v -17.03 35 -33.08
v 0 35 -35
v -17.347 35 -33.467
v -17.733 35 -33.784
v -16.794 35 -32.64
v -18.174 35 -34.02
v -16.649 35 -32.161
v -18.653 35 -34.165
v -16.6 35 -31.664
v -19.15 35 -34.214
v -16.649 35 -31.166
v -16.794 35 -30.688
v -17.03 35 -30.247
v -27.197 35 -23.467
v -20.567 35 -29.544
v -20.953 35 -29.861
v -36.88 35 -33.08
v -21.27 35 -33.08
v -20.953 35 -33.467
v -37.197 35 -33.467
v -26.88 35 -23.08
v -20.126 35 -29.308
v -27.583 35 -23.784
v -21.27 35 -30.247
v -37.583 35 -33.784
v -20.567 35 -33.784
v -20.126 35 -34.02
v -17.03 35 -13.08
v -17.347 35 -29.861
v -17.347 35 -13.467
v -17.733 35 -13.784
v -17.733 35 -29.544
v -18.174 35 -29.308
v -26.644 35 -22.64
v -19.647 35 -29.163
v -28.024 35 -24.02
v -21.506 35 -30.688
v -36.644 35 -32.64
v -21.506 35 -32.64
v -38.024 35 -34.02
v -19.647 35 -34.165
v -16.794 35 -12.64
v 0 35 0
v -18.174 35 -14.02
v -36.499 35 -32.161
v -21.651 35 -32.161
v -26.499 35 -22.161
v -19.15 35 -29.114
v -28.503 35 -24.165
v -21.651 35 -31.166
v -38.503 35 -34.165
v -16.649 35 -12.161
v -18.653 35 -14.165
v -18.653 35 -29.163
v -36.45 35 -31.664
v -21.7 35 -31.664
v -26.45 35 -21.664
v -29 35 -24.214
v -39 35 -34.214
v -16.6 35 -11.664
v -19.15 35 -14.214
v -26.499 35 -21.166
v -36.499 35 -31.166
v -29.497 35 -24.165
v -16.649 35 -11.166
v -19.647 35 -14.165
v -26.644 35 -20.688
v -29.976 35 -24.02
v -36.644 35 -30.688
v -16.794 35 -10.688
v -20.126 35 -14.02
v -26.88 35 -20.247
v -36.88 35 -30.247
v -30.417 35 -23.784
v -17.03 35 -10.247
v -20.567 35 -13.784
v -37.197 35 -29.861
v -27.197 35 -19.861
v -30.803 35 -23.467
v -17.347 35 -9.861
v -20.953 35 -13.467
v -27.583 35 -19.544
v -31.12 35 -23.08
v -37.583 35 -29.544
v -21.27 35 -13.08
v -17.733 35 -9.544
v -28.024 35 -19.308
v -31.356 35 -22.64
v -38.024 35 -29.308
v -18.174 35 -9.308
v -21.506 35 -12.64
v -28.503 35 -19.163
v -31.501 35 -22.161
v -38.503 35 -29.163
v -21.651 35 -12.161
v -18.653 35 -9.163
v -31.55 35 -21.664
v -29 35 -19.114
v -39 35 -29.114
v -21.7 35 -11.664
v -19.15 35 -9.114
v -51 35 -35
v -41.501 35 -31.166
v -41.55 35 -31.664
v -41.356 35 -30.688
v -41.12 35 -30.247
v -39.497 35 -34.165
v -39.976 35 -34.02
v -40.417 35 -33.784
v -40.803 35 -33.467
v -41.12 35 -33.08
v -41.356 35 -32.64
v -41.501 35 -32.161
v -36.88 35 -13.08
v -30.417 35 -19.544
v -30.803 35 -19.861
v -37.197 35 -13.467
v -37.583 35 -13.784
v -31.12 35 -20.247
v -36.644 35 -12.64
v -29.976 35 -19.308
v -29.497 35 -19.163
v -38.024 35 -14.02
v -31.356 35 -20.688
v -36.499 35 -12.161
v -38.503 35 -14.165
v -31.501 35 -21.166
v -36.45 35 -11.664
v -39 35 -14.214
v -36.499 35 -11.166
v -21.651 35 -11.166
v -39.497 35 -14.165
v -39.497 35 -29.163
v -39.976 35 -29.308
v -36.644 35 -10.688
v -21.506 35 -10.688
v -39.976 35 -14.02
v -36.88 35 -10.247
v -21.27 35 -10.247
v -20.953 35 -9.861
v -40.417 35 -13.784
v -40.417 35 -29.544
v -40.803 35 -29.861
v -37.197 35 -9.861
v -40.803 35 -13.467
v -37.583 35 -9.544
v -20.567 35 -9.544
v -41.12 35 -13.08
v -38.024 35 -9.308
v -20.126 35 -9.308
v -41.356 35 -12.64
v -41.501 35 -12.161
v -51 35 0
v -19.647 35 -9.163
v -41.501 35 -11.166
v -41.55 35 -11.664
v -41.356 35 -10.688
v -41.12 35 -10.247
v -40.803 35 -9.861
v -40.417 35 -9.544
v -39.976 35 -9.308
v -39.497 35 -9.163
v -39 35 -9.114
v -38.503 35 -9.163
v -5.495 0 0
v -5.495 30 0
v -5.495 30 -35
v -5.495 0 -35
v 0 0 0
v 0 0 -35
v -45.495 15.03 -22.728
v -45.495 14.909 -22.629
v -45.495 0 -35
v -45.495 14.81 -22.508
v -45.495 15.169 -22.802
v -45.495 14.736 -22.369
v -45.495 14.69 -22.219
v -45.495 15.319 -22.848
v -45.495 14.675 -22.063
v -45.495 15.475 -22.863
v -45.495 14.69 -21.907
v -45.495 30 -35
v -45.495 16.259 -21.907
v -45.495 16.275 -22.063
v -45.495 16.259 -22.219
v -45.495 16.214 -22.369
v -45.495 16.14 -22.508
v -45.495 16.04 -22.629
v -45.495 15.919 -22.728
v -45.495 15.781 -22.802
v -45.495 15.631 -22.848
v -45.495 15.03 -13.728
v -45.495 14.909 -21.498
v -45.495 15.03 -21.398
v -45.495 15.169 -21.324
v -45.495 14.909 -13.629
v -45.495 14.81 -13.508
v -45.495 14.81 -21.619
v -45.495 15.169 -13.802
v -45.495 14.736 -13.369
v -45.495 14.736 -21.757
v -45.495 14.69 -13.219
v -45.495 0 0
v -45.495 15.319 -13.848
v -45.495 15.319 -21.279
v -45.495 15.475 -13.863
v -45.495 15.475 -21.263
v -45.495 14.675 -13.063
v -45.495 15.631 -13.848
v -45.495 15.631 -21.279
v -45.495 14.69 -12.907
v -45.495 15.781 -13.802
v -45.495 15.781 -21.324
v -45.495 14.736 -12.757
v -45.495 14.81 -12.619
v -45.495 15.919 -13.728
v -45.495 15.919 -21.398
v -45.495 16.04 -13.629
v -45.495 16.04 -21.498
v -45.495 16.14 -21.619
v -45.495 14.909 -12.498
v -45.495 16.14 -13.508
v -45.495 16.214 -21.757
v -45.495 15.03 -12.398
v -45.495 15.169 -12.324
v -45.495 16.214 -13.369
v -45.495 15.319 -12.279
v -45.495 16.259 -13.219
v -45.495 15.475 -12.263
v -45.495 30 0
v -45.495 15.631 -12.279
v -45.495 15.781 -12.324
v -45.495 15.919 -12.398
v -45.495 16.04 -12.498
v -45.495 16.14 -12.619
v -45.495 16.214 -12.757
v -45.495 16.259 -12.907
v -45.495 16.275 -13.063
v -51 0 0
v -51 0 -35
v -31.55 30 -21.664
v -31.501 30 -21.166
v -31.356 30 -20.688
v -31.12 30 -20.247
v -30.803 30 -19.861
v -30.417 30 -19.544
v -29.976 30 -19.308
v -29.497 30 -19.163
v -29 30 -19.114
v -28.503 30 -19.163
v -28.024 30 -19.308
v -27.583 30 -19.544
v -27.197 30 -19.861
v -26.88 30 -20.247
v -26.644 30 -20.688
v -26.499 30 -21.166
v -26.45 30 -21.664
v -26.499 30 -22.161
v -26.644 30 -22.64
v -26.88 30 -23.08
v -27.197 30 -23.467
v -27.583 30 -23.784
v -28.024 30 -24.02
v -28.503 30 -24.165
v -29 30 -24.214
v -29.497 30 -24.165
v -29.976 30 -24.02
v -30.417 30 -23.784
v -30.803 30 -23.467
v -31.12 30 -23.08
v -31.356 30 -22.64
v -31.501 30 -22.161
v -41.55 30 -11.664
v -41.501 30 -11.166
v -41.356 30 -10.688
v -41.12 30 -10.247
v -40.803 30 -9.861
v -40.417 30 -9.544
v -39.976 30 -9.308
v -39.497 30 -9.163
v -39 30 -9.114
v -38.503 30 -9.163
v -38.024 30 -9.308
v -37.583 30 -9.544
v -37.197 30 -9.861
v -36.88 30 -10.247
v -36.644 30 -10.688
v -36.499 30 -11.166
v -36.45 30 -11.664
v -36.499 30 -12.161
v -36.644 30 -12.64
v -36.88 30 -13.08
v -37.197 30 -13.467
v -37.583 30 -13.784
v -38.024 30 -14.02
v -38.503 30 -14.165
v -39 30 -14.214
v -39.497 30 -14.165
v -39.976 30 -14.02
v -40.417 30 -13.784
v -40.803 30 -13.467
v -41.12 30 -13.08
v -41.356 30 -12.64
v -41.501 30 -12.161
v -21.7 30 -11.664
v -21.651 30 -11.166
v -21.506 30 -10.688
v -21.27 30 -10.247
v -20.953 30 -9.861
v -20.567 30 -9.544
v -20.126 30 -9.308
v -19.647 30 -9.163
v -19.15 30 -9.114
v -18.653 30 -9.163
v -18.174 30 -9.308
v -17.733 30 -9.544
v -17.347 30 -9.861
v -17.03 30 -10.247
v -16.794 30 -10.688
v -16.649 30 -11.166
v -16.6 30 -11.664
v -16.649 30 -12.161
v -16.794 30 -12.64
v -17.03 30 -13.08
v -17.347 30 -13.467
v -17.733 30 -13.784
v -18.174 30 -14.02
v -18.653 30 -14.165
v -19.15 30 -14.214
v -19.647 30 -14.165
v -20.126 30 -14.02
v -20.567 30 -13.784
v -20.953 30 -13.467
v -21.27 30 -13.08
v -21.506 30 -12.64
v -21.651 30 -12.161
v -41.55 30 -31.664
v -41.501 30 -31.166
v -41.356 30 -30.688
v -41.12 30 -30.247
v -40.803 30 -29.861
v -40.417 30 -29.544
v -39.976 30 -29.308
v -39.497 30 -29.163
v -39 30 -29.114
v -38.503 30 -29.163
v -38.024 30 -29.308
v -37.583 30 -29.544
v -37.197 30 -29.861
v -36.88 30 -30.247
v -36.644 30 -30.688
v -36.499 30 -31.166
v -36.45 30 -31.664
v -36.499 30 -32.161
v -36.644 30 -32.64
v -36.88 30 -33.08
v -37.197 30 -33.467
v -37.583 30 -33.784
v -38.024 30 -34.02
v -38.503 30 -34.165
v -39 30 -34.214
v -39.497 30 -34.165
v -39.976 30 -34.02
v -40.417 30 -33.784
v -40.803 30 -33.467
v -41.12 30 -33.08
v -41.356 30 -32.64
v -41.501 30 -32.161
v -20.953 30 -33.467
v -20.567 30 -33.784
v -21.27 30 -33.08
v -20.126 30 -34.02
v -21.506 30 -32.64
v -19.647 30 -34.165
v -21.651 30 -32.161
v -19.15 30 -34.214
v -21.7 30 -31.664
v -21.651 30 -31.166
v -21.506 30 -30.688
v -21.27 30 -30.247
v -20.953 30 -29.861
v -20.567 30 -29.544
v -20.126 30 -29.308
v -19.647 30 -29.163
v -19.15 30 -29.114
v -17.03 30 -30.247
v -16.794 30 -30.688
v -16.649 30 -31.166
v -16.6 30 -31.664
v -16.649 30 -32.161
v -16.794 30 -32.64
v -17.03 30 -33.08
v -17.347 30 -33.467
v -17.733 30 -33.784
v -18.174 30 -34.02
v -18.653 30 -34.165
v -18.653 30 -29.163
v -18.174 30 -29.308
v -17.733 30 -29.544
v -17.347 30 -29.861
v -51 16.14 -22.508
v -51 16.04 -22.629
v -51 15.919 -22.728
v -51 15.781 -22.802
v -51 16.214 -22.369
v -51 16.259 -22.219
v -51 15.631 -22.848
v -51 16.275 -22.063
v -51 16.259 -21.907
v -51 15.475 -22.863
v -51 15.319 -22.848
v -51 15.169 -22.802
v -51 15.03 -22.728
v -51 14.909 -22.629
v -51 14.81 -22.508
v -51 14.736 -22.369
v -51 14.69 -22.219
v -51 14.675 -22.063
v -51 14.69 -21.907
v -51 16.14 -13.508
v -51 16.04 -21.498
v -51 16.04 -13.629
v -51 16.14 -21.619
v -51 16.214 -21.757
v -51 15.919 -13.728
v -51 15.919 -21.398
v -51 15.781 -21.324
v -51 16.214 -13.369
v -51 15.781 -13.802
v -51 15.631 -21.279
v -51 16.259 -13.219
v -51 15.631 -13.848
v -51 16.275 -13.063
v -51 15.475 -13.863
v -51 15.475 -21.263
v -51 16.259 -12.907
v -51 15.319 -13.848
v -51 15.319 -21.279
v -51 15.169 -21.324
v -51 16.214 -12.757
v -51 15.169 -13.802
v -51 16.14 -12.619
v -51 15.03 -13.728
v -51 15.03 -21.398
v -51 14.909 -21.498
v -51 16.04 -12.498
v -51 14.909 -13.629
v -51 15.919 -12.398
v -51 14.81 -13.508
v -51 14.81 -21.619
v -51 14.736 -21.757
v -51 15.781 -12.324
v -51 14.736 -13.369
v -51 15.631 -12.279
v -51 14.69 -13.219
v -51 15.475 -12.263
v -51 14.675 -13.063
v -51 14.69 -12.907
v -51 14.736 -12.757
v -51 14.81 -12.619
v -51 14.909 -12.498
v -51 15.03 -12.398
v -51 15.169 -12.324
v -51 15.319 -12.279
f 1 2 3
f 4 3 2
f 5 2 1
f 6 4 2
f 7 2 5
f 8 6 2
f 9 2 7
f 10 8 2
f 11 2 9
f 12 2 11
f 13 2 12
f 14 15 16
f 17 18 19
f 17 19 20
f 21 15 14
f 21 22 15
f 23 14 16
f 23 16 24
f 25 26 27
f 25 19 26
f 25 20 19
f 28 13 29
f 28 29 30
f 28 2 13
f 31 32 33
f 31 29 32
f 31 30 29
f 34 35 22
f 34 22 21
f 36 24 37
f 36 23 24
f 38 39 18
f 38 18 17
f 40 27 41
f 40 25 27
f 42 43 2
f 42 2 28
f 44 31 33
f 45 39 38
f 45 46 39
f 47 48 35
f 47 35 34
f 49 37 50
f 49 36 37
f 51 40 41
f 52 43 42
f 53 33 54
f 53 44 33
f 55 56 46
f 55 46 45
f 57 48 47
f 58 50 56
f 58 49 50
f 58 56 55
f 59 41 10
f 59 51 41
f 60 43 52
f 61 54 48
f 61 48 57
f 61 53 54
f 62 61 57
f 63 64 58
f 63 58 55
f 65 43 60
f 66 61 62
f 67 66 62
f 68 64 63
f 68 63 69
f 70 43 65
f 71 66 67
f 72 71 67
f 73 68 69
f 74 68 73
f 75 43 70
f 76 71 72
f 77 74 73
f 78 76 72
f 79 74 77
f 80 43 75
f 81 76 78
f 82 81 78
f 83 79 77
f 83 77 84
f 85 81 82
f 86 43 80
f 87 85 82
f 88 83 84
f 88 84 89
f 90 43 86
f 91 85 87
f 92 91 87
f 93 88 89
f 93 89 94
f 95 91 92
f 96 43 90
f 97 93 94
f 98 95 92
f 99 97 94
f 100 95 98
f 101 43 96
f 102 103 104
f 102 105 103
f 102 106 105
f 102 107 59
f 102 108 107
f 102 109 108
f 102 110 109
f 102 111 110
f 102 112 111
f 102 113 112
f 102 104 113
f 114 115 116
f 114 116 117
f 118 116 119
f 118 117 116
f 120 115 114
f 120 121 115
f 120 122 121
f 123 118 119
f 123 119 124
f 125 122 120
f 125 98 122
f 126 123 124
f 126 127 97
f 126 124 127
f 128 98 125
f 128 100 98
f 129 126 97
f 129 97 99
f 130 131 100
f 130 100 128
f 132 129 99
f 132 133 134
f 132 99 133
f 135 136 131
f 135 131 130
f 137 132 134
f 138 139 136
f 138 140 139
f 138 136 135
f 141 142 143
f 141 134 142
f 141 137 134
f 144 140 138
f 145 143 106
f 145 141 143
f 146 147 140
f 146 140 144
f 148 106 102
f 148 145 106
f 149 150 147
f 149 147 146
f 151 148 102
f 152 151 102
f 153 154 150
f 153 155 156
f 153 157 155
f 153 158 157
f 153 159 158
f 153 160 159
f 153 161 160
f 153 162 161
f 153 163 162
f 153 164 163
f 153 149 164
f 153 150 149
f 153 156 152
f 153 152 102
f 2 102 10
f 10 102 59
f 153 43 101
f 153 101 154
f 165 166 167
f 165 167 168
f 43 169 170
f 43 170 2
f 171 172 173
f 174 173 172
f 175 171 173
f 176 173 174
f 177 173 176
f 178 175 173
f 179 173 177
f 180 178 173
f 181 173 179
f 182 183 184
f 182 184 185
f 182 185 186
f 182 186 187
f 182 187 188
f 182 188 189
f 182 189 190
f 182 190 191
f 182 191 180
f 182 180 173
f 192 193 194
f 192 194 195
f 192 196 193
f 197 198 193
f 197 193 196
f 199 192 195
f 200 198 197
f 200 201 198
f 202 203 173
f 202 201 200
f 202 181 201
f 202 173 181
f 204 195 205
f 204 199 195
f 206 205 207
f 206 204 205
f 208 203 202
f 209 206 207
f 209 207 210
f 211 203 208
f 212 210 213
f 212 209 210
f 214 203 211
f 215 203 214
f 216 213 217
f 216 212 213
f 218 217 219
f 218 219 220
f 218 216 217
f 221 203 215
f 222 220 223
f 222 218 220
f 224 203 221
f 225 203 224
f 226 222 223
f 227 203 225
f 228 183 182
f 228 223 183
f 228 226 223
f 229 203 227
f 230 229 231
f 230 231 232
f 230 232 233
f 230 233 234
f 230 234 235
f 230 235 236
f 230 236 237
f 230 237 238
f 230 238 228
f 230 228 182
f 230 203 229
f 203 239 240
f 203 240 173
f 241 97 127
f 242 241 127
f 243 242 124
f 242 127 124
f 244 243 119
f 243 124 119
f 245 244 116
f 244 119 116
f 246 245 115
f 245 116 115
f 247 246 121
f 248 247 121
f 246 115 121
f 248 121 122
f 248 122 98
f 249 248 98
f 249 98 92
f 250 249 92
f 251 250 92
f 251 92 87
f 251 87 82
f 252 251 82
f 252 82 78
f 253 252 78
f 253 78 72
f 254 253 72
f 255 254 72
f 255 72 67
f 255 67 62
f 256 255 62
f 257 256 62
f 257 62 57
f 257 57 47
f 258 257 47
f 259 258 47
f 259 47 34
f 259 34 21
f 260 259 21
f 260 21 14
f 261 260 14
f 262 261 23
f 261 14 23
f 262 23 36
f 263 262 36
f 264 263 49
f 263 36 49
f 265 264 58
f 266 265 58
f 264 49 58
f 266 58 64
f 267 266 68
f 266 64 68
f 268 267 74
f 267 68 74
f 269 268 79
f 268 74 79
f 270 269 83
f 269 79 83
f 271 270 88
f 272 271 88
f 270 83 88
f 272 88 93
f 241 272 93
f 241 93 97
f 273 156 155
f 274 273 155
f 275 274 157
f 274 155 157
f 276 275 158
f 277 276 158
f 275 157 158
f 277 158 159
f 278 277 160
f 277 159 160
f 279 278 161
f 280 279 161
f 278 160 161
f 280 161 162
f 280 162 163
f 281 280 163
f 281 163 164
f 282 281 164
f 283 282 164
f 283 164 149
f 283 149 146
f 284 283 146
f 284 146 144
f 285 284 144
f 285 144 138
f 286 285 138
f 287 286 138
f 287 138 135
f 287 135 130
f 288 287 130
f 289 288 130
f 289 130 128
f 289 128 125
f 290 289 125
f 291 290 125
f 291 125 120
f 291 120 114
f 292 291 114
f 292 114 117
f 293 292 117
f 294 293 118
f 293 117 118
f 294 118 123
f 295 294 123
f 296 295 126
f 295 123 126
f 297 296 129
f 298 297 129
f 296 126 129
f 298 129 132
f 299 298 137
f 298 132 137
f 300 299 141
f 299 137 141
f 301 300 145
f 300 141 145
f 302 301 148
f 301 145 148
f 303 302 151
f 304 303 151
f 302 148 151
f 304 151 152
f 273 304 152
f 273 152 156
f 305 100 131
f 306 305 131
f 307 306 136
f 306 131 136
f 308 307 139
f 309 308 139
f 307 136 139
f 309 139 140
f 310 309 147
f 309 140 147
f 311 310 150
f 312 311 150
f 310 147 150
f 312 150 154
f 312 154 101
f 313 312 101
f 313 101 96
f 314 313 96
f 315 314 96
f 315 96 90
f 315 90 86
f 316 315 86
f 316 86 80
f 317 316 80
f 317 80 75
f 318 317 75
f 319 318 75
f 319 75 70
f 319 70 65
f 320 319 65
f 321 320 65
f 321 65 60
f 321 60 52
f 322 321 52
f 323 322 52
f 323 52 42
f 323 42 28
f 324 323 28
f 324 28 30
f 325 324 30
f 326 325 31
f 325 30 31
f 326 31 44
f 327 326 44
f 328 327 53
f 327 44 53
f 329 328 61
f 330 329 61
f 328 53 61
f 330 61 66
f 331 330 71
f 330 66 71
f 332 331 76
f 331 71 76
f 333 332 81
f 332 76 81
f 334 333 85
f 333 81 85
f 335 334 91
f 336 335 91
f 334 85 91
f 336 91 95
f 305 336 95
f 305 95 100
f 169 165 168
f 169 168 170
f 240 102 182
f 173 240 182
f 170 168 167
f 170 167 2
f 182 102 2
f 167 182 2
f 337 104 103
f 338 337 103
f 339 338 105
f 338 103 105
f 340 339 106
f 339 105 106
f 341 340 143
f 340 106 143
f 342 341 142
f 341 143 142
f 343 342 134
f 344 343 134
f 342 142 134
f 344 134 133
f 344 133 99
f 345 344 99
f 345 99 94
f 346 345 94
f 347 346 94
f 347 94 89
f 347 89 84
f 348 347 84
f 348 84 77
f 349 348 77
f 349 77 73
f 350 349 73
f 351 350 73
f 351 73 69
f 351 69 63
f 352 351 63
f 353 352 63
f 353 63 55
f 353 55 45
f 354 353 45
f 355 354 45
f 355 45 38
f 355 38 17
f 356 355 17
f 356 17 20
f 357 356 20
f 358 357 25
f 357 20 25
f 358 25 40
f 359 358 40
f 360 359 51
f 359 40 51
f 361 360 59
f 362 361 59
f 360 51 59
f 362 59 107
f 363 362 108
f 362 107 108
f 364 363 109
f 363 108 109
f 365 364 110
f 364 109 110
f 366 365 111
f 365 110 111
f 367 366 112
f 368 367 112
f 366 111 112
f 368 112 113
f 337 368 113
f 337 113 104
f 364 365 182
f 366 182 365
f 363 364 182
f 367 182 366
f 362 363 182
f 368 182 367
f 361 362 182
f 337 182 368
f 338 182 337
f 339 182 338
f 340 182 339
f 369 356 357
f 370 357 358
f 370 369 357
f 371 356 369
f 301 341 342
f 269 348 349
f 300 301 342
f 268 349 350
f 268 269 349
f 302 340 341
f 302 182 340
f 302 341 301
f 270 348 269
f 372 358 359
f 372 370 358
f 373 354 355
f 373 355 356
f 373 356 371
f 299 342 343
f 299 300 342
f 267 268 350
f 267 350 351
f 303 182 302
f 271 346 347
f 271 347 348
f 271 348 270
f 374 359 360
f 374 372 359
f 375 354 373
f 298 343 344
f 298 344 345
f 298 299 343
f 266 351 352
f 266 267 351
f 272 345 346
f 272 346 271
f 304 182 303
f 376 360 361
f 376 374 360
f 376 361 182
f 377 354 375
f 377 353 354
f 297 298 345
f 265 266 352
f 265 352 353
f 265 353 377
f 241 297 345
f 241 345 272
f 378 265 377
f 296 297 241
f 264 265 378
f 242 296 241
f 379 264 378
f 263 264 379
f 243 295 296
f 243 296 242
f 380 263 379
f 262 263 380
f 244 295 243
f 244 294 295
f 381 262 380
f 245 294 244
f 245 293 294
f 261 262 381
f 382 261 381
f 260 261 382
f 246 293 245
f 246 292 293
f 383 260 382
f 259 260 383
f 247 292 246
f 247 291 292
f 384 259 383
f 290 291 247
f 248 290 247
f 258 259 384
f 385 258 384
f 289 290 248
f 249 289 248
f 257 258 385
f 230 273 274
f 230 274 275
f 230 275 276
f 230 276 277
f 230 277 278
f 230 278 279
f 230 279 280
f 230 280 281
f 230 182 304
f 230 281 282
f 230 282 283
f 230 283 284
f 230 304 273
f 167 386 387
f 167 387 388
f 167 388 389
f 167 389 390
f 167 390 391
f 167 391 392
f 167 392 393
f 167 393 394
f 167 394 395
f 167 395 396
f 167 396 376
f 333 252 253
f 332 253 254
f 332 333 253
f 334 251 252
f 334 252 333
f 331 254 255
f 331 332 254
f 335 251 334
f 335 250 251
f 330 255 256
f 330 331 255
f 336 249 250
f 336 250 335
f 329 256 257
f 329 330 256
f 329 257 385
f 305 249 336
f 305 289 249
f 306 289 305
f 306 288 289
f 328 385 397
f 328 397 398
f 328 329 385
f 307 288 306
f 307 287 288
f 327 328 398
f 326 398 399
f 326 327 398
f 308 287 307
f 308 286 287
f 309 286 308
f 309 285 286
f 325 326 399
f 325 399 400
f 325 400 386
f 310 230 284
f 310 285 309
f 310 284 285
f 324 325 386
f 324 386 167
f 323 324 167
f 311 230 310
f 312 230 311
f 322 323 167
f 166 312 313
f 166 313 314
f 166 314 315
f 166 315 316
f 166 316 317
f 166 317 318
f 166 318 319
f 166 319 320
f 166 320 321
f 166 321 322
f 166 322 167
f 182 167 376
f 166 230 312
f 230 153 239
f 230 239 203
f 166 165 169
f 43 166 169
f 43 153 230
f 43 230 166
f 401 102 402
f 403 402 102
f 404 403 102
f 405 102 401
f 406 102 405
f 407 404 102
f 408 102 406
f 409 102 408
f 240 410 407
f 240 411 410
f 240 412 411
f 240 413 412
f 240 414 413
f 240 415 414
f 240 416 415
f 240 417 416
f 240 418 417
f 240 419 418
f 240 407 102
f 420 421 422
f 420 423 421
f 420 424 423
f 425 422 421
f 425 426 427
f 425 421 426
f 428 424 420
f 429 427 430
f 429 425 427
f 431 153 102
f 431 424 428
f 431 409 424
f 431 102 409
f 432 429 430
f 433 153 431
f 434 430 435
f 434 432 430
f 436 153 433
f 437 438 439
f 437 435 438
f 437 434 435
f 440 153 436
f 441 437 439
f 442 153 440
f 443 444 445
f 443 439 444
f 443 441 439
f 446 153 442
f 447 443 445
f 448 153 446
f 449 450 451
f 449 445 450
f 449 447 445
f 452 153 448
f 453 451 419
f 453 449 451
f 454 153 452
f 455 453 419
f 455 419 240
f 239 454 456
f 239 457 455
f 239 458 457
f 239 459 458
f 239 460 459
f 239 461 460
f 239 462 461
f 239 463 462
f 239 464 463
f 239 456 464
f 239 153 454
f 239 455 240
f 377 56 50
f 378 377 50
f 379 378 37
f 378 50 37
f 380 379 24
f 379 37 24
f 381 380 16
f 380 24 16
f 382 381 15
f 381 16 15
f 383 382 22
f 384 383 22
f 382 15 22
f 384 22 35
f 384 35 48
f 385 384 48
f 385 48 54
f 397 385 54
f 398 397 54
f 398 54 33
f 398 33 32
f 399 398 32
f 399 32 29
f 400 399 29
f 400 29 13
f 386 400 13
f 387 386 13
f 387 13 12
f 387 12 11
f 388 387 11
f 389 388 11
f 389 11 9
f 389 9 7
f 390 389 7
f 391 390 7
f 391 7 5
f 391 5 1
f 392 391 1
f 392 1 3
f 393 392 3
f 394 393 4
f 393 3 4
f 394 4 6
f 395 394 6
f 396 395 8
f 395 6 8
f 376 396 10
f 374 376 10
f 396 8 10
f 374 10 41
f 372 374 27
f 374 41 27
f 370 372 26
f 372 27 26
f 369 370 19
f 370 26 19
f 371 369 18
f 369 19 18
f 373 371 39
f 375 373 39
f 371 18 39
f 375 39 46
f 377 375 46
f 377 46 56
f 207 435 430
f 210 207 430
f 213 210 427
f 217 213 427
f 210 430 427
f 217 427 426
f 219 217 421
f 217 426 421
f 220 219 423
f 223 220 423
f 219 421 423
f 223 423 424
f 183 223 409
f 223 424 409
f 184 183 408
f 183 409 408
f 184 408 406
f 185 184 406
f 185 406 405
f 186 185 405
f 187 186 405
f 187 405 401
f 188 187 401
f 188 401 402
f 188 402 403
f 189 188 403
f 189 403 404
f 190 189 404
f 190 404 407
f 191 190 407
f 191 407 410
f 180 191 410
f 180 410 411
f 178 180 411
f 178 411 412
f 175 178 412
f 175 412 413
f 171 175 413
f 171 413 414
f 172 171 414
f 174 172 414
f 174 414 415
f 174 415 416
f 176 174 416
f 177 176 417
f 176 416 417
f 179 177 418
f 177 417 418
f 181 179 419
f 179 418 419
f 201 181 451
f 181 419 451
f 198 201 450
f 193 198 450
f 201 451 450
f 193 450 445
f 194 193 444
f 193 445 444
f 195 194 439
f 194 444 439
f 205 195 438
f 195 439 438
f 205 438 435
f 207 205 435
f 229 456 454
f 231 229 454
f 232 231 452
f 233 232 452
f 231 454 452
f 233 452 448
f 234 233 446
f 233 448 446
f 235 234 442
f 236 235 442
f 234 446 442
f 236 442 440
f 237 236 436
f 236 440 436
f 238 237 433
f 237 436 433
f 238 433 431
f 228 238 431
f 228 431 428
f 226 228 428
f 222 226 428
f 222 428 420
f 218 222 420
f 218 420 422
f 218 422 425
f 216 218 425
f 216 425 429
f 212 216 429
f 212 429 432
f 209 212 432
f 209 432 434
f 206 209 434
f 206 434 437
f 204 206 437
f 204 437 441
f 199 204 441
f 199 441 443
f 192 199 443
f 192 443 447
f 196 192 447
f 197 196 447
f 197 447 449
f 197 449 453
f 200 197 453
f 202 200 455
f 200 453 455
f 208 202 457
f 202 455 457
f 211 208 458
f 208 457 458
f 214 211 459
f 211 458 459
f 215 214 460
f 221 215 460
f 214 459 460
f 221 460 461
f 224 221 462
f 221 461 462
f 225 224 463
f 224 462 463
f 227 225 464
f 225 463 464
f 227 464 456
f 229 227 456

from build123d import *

# Parameters (mm, degrees)
BOSS_EXTRUDE1_DEPTH = 35
SKETCH2_R           = 0.8
CUT_EXTRUDE1_DEPTH  = 6
SKETCH3_R           = 2.55
CUT_EXTRUDE2_DEPTH  = 6


with BuildPart() as part:
    # Sketch1 → Boss-Extrude1 (new body)
    with BuildSketch(Plane.XY):
        Polygon((-45.495099545, 30), (-5.495099545, 30), (-5.495099545, 0), (0, 0), (0, 35), (-51, 35), (-51, 0), (-45.495099545, 0), align=None)
    extrude(amount=-BOSS_EXTRUDE1_DEPTH)

    # Sketch2 → Cut-Extrude1 (cut)
    with BuildSketch(Plane.ZY.offset(51)):
        with Locations((-13.063320716, 15.474711623)):
            Circle(SKETCH2_R)
        with Locations((-22.063320716, 15.474711623)):
            Circle(SKETCH2_R)
    extrude(amount=-CUT_EXTRUDE1_DEPTH, mode=Mode.SUBTRACT)

    # Sketch3 → Cut-Extrude2 (cut)
    with BuildSketch(Plane(origin=(0, 35, 0), x_dir=(1, 0, 0), z_dir=(0, 1, 0))):
        with Locations(Location((-39, 31.663775096, 0), (0, 0, 180))):
            Circle(SKETCH3_R)
        with Locations(Location((-39, 11.663775096, 0), (0, 0, 180))):
            Circle(SKETCH3_R)
        with Locations(Location((-19.15, 31.663775096, 0), (0, 0, 180))):
            Circle(SKETCH3_R)
        with Locations(Location((-19.15, 11.663775096, 0), (0, 0, 180))):
            Circle(SKETCH3_R)
        with Locations(Location((-29, 21.663775096, 0), (0, 0, 180))):
            Circle(SKETCH3_R)
    extrude(amount=-CUT_EXTRUDE2_DEPTH, mode=Mode.SUBTRACT)


solid = part.part
